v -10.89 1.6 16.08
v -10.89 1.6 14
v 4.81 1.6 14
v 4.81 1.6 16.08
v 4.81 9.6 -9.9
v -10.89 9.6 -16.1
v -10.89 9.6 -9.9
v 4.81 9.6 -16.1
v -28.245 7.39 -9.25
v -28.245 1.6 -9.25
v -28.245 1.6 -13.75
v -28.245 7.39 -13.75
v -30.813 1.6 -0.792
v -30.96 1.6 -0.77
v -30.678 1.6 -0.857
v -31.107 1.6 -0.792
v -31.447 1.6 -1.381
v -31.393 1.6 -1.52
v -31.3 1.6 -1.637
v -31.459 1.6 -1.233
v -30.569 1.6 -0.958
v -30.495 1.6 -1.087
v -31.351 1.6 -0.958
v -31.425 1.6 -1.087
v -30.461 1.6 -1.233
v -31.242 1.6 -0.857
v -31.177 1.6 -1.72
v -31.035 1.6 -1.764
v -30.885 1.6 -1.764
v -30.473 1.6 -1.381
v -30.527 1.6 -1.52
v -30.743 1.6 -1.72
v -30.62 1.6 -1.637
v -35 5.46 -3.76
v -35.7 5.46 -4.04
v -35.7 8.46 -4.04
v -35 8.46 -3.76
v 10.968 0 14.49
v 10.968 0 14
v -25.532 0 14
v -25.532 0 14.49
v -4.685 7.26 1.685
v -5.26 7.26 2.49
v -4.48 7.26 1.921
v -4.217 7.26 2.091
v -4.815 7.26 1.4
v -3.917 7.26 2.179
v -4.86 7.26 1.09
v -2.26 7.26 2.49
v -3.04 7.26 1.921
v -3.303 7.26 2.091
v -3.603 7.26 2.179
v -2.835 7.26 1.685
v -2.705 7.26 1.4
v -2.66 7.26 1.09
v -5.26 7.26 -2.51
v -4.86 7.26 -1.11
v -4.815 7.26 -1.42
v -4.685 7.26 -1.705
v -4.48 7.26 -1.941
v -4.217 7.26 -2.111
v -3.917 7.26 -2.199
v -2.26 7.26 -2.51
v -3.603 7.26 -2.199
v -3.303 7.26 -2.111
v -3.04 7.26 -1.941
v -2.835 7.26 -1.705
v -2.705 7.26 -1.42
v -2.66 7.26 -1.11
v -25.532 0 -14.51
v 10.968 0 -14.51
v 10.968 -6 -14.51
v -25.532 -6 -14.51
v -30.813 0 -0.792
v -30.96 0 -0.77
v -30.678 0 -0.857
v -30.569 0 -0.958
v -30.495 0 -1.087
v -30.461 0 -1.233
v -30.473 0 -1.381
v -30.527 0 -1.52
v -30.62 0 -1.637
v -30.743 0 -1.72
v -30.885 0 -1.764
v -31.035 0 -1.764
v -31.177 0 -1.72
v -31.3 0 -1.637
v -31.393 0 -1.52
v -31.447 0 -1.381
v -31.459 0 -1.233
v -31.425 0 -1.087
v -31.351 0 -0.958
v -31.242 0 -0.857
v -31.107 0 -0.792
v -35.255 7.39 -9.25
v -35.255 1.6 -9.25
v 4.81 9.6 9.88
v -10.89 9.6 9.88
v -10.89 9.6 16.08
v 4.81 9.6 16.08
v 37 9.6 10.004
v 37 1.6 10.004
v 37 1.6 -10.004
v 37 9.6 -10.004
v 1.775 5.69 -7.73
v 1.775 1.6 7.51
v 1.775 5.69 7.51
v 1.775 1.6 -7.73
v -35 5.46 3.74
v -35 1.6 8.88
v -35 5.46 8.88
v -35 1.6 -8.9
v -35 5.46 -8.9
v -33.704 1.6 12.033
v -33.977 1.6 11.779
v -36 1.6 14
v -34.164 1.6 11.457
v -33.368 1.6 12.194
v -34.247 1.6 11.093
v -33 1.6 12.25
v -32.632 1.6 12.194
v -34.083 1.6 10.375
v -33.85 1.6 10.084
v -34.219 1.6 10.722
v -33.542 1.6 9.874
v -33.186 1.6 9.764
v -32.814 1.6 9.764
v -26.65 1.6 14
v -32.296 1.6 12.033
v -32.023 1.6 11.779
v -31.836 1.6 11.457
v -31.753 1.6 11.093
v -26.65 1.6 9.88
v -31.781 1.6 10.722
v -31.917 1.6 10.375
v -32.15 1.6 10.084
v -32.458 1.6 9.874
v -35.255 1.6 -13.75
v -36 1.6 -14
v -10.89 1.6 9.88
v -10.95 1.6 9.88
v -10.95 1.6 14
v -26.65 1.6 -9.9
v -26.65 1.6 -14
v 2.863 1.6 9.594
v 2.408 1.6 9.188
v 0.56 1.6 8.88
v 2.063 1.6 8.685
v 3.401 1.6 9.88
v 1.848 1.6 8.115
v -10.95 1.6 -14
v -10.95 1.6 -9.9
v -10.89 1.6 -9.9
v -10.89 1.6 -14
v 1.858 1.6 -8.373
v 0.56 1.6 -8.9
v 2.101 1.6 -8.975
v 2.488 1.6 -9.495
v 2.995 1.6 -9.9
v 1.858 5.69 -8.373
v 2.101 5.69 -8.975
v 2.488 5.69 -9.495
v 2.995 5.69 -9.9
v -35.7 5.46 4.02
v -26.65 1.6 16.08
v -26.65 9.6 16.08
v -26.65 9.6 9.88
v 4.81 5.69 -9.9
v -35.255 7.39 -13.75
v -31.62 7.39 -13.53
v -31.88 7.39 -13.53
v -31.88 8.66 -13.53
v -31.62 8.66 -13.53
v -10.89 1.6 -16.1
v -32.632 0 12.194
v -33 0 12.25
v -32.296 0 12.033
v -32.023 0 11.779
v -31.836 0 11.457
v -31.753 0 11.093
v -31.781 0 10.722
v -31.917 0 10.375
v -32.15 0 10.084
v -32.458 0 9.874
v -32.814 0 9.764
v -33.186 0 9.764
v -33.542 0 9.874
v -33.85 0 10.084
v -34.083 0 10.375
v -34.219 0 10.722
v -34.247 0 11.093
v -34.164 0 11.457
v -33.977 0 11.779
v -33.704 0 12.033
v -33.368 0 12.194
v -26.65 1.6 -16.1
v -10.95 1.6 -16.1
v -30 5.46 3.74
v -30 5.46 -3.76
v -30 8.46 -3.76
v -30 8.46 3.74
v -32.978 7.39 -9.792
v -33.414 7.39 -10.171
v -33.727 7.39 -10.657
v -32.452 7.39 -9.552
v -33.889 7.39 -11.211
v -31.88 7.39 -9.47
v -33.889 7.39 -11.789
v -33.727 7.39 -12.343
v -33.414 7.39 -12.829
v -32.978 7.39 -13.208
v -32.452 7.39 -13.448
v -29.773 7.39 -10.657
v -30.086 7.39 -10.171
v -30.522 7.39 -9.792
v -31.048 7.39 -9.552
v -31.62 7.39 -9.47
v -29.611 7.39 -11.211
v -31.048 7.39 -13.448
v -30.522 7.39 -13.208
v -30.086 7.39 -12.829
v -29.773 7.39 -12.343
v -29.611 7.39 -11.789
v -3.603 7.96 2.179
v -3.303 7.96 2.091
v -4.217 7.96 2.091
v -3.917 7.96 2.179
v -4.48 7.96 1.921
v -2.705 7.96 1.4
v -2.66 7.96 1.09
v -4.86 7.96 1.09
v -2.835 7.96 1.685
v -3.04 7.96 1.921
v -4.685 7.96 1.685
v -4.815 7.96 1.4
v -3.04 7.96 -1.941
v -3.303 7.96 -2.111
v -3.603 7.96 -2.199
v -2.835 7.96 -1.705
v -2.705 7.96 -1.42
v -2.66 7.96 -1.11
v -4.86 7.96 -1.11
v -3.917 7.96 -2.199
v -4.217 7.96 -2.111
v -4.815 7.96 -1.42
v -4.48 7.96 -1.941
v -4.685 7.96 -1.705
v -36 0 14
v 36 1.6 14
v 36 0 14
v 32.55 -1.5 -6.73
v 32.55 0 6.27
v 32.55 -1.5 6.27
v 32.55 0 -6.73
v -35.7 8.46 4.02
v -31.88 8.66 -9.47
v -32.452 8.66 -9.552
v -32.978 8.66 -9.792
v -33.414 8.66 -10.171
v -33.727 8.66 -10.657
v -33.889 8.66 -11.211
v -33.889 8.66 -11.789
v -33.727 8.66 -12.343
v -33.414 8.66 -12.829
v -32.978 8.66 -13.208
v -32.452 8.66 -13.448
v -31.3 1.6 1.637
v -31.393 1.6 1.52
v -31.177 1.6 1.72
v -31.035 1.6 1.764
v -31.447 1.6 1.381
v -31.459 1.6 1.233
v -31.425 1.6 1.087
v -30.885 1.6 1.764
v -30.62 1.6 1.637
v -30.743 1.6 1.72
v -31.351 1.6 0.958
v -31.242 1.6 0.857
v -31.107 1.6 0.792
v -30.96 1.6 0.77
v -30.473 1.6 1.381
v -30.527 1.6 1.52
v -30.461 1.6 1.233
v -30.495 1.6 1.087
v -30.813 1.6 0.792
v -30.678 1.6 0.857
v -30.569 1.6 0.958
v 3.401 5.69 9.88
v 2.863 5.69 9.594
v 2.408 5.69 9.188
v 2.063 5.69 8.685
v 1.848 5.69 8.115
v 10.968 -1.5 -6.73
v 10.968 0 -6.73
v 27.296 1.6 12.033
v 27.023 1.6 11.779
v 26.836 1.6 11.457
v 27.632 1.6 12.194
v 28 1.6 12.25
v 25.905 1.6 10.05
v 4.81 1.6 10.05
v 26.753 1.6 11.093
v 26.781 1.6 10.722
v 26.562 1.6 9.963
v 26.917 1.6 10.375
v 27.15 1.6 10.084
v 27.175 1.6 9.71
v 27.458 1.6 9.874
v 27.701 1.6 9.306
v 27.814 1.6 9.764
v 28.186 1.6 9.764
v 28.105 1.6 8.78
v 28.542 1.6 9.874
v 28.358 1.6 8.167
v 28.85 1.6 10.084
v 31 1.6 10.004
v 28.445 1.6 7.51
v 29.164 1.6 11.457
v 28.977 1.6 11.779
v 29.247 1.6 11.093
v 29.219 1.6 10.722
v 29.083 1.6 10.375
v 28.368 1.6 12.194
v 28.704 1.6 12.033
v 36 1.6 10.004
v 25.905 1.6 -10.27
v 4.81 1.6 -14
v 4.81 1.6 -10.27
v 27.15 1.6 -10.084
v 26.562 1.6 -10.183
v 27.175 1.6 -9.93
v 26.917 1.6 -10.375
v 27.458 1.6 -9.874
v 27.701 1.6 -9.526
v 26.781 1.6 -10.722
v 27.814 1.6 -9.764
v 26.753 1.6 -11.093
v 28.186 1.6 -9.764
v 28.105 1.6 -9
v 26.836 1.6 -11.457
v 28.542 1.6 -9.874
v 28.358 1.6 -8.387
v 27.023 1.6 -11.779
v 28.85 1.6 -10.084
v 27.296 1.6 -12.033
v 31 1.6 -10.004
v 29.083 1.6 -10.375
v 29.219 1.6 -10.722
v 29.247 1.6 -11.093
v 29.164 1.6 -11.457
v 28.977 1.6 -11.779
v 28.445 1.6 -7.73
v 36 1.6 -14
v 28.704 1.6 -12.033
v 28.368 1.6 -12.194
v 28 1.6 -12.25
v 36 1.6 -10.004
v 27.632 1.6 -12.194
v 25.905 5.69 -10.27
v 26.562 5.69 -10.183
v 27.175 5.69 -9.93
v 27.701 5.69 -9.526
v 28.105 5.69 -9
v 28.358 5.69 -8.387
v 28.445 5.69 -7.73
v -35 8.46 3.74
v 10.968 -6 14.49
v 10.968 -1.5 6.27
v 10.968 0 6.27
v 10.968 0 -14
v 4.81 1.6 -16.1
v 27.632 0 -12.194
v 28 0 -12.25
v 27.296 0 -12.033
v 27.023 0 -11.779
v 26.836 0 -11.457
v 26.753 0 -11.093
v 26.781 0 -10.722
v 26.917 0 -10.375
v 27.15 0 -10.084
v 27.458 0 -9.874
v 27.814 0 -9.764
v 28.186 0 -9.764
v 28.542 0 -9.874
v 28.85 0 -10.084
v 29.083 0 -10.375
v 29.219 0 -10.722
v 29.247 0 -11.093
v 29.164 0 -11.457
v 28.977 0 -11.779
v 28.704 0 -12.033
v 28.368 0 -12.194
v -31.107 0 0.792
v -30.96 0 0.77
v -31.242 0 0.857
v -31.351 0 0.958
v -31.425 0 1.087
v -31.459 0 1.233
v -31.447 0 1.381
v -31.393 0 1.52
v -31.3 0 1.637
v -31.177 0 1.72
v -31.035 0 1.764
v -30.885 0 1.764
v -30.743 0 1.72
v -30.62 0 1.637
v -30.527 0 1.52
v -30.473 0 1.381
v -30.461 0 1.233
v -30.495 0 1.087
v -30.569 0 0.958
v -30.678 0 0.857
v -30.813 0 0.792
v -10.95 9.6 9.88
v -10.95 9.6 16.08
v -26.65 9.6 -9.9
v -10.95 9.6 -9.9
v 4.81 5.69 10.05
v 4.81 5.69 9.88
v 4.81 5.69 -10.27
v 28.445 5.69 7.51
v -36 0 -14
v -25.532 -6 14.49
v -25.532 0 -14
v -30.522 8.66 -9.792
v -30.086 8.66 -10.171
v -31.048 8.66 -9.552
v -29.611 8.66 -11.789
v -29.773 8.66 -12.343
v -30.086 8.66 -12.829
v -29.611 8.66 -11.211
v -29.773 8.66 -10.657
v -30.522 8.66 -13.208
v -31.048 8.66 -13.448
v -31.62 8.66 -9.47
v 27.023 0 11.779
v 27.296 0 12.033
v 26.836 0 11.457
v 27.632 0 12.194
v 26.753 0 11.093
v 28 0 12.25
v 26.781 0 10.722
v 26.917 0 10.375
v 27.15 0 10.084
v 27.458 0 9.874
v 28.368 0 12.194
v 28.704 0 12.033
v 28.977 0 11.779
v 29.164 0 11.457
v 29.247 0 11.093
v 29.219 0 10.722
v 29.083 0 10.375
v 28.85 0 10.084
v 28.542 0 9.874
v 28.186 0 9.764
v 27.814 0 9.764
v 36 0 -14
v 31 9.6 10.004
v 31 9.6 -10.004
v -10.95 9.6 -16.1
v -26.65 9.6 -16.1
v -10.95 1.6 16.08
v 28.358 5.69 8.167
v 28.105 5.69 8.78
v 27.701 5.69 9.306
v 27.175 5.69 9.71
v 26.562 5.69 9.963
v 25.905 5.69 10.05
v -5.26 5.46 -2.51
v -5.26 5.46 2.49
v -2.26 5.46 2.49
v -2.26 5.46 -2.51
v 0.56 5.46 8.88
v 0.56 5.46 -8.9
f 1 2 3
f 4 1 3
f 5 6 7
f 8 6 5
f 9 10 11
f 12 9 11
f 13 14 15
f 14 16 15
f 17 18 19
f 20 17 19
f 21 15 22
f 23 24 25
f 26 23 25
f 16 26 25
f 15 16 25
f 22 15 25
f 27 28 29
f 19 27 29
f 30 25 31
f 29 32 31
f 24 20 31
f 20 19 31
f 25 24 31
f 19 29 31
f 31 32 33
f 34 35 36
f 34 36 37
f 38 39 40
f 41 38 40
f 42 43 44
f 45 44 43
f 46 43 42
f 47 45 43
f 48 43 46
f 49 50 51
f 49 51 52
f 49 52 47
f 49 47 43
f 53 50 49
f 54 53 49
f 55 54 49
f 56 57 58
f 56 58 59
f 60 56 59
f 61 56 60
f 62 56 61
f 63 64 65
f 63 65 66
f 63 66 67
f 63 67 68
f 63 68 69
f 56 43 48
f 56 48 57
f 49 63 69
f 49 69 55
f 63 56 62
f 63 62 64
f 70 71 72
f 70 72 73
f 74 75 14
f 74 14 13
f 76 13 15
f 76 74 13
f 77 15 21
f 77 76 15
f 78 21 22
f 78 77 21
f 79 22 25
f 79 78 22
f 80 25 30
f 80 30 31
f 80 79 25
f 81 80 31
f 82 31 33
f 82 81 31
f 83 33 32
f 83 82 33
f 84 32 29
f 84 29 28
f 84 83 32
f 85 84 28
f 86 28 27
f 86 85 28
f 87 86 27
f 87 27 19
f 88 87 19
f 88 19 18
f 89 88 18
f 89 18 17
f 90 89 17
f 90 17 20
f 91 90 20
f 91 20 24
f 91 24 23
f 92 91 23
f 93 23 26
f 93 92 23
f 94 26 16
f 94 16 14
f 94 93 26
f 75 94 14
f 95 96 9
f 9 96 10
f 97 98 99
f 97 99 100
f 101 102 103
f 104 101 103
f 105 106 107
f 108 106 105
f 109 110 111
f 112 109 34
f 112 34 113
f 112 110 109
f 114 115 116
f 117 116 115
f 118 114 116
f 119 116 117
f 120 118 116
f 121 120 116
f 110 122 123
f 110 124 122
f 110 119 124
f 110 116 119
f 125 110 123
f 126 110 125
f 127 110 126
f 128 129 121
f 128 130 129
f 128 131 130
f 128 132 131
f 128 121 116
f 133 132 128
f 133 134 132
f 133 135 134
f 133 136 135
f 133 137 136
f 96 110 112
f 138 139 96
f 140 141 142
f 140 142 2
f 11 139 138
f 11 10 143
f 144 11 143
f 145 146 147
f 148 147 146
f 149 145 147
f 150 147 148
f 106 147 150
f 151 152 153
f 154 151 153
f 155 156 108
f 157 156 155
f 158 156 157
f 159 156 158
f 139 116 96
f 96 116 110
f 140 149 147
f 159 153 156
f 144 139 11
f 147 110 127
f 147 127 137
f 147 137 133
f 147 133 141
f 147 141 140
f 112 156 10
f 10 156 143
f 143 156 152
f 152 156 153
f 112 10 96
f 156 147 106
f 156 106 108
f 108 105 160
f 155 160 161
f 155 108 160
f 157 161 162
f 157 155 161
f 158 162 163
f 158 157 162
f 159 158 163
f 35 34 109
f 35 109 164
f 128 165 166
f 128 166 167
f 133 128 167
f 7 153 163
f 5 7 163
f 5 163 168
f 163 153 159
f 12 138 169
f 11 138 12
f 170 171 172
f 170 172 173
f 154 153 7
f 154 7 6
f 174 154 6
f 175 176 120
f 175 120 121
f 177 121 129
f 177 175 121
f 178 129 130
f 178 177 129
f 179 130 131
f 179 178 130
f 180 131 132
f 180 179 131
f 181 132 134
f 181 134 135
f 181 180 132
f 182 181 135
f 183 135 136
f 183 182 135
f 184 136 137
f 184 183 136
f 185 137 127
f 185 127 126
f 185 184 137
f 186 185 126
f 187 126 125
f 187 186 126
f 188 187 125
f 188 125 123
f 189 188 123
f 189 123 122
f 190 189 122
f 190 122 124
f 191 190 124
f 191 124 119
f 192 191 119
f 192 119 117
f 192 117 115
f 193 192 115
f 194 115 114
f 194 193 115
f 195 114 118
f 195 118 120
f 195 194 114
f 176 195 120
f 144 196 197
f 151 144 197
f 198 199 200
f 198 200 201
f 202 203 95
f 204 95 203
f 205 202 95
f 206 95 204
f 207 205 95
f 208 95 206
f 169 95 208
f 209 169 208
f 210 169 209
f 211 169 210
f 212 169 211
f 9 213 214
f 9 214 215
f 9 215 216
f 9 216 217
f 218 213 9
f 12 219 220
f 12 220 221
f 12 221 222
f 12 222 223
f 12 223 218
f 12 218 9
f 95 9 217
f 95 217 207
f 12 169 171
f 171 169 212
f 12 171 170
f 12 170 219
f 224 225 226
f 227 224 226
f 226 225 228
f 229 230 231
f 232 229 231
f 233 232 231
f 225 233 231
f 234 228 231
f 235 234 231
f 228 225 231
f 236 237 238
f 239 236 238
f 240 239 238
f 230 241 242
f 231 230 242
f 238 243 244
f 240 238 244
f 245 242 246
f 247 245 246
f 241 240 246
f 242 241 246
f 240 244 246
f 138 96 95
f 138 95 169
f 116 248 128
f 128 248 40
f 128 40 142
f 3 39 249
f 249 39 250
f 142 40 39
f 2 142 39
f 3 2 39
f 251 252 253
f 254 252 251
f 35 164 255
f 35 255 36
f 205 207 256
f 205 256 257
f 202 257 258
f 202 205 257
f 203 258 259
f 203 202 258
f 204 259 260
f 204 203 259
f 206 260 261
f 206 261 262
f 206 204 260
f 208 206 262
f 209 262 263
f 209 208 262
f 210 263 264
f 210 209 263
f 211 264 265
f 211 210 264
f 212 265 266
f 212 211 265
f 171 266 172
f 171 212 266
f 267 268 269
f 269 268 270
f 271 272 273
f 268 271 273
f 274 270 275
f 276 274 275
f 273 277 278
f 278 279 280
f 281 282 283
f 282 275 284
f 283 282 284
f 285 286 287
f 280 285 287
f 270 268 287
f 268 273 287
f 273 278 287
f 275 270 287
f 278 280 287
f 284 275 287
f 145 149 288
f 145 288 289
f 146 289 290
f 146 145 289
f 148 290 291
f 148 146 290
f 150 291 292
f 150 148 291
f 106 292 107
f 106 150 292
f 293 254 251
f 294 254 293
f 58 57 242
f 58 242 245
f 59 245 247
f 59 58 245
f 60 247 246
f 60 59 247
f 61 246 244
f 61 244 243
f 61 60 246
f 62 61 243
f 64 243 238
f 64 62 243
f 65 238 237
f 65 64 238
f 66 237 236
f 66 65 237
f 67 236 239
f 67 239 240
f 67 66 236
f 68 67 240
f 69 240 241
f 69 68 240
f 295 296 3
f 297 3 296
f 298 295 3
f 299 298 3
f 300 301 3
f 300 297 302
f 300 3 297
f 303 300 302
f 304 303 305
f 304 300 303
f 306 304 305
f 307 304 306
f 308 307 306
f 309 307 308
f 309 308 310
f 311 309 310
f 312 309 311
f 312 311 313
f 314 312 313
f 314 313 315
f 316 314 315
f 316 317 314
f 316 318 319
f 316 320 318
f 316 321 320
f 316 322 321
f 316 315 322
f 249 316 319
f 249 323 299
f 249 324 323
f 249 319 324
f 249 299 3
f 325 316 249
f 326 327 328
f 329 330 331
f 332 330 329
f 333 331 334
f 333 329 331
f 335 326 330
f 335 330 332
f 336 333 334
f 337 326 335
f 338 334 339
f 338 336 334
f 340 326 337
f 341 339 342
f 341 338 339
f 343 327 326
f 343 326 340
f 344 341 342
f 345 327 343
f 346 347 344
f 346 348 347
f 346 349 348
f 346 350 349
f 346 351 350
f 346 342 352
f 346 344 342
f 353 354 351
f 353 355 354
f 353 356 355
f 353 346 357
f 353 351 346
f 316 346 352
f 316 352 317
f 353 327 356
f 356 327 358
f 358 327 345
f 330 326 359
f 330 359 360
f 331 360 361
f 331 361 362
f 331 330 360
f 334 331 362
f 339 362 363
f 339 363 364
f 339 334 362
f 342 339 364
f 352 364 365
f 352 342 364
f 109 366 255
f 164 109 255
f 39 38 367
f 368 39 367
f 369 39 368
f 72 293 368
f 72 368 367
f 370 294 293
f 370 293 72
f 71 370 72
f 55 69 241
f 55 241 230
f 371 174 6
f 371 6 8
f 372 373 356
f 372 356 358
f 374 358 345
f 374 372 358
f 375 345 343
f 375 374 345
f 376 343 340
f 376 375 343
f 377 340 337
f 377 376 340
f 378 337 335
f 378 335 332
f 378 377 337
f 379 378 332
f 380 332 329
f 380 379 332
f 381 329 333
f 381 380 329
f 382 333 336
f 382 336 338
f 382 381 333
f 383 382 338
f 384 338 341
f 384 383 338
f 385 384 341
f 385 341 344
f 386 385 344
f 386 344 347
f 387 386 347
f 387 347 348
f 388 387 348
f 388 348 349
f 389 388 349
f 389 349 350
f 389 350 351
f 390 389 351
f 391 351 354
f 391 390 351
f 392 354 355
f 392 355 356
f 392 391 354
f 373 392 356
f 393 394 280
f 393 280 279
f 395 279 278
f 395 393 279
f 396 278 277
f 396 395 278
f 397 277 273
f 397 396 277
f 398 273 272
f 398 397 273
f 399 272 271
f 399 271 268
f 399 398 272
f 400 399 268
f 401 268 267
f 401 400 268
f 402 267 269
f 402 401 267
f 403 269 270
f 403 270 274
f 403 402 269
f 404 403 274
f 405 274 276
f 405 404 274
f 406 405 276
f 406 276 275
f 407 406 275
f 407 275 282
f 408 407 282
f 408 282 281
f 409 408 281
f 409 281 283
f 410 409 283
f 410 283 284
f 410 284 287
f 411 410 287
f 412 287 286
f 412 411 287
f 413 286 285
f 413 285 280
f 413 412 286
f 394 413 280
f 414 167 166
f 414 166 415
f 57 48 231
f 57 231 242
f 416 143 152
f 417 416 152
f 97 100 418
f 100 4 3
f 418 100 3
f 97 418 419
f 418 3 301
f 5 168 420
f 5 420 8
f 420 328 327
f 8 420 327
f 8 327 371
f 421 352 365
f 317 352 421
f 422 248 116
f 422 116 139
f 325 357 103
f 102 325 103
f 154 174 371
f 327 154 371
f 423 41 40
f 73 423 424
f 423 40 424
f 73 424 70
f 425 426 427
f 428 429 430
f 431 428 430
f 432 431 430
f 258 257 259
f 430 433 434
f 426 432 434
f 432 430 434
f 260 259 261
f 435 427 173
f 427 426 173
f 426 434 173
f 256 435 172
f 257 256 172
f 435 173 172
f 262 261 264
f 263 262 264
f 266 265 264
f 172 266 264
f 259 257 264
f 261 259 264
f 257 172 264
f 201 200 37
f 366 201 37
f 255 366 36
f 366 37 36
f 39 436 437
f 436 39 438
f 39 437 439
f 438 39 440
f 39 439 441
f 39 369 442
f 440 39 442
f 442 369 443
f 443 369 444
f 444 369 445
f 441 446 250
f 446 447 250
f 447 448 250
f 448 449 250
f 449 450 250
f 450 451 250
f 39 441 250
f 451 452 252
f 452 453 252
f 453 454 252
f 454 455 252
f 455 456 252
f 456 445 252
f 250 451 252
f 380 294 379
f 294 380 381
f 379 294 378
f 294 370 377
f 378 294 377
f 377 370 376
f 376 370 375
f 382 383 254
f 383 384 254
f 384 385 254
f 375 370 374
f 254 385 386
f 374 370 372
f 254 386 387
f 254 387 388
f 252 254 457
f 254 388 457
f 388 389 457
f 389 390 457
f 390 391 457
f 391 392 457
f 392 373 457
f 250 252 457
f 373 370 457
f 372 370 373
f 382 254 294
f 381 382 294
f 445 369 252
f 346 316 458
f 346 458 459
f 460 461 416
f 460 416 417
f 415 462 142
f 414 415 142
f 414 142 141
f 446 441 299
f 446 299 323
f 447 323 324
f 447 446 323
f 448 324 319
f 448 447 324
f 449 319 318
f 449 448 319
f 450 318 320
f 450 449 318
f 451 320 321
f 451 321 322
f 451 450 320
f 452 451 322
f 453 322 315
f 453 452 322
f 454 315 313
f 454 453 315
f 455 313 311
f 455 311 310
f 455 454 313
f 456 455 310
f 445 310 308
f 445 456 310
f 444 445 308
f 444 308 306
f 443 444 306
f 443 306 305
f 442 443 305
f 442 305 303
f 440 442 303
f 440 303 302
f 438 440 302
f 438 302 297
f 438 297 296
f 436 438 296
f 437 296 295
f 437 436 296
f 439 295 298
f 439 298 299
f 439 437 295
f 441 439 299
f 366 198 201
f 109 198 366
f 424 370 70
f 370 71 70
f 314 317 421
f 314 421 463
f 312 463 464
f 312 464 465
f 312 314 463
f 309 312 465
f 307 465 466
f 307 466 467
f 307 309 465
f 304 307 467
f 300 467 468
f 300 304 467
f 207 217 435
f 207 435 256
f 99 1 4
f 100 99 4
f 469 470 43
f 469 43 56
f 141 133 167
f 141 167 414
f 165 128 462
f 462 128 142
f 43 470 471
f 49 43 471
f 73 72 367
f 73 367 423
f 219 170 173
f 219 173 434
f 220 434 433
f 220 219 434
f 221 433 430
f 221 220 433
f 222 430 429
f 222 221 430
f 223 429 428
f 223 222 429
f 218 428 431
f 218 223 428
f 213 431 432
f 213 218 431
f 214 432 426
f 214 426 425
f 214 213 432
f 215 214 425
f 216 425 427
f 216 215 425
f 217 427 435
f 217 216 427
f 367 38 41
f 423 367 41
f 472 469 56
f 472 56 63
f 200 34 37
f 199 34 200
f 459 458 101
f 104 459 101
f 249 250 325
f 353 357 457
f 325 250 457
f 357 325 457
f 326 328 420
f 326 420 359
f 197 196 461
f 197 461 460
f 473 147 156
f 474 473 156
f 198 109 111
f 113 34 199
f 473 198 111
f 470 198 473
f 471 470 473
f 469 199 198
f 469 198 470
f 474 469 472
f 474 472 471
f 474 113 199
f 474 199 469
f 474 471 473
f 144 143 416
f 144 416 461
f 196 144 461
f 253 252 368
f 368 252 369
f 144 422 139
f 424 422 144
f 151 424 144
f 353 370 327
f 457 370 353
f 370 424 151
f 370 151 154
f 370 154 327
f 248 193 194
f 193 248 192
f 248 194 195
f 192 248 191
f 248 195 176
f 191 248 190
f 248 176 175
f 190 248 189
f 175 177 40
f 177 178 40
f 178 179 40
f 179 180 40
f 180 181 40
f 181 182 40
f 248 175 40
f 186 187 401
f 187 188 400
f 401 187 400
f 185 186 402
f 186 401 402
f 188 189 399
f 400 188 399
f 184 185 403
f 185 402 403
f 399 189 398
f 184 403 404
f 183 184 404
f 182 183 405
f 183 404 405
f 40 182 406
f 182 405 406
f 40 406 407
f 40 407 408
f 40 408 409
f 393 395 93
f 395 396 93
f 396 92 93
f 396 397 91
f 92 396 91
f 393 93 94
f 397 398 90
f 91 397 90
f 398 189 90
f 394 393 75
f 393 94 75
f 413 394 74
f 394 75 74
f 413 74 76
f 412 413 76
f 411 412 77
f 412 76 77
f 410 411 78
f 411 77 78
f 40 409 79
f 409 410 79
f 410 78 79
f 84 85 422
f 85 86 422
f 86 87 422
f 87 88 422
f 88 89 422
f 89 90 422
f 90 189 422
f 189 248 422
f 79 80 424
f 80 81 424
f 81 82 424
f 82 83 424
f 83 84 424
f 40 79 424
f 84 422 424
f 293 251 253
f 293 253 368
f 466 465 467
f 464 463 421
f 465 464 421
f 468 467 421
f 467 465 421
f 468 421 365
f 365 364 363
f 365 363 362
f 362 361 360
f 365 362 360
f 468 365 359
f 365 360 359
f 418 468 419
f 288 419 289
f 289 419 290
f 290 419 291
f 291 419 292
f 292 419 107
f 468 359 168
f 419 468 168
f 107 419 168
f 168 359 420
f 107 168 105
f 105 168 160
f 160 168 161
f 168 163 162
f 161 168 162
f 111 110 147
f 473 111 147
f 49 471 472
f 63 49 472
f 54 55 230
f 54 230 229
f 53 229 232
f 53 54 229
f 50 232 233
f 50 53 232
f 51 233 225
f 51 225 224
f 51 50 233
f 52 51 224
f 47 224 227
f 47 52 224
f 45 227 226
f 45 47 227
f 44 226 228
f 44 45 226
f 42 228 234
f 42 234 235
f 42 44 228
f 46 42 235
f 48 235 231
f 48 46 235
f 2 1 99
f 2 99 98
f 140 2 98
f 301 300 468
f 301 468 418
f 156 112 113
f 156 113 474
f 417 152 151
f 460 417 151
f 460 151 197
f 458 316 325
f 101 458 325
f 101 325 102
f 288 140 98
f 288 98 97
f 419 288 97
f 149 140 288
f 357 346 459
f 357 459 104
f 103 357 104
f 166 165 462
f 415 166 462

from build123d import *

# Parameters (mm, degrees)
SKETCH1_W            = 72
SKETCH1_H            = 28
SKETCH1_R            = 1.25
SKETCH1_R_2          = 0.5
BOSS_EXTRUDE1_DEPTH  = 1.6
SKETCH2_W            = 35.56
SKETCH2_H            = 17.78
BOSS_EXTRUDE2_DEPTH  = 3.86
BOSS_EXTRUDE3_DEPTH  = 3
SKETCH4_W            = 3
SKETCH4_H            = 5
BOSS_EXTRUDE4_DEPTH  = 1.8
BOSS_EXTRUDE5_DEPTH  = 0.7
BOSS_EXTRUDE6_DEPTH  = 4.09
SKETCH7_W            = 15.7
SKETCH7_H            = 6.2
BOSS_EXTRUDE7_DEPTH  = 8
SKETCH8_W            = 30
SKETCH8_H            = 13
BOSS_EXTRUDE8_DEPTH  = 1.5
SKETCH9_W            = 6
SKETCH9_H            = 20.007270078
BOSS_EXTRUDE9_DEPTH  = 8
SKETCH10_W           = 36.5
SKETCH10_H           = 29
BOSS_EXTRUDE10_DEPTH = 6
SKETCH12_W           = 7.01
SKETCH12_H           = 4.5
BOSS_EXTRUDE11_DEPTH = 5.79
BOSS_EXTRUDE12_DEPTH = 1.27


with BuildPart() as part:
    # Sketch1 → Boss-Extrude1 (new body)
    with BuildSketch(Plane(origin=(0, 0, 0), x_dir=(1, 0, 0), z_dir=(0, 1, 0))):
        Rectangle(SKETCH1_W, SKETCH1_H)
        with Locations(Location((-33, -11, 0), (0, 0, 270))):
            Circle(SKETCH1_R, mode=Mode.SUBTRACT)
        with Locations(Location((28, -11, 0), (0, 0, 270))):
            Circle(SKETCH1_R, mode=Mode.SUBTRACT)
        with Locations(Location((-30.96, 1.27, 0), (0, 0, 270))):
            Circle(SKETCH1_R_2, mode=Mode.SUBTRACT)
        with Locations(Location((28, 11, 0), (0, 0, 90))):
            Circle(SKETCH1_R, mode=Mode.SUBTRACT)
        with Locations(Location((-30.96, -1.27, 0), (0, 0, 90))):
            Circle(SKETCH1_R_2, mode=Mode.SUBTRACT)
    extrude(amount=BOSS_EXTRUDE1_DEPTH)

    # Sketch2 → Boss-Extrude2 (add)
    with BuildSketch(Plane(origin=(0, 1.6, 0), x_dir=(1, 0, 0), z_dir=(0, 1, 0))):
        with Locations((-17.22, 0.01)):
            Rectangle(SKETCH2_W, SKETCH2_H)
    extrude(amount=BOSS_EXTRUDE2_DEPTH)

    # Sketch3 → Boss-Extrude3 (add)
    with BuildSketch(Plane(origin=(0, 5.46, 0), x_dir=(1, 0, 0), z_dir=(0, 1, 0))):
        Polygon((-35, 3.76), (-30, 3.76), (-30, -3.74), (-35, -3.74), (-35.7, -4.02), (-35.7, 4.04), align=None)
    extrude(amount=BOSS_EXTRUDE3_DEPTH)

    # Sketch4 → Boss-Extrude4 (add)
    with BuildSketch(Plane(origin=(0, 5.46, 0), x_dir=(1, 0, 0), z_dir=(0, 1, 0))):
        with Locations((-3.76, 0.01)):
            Rectangle(SKETCH4_W, SKETCH4_H)
    extrude(amount=BOSS_EXTRUDE4_DEPTH)

    # Sketch5 → Boss-Extrude5 (add)
    with BuildSketch(Plane(origin=(0, 7.26, 0), x_dir=(1, 0, 0), z_dir=(0, 1, 0))):
        with BuildLine():
            Line((-2.66, 1.11), (-2.66, -1.09))
            ThreePointArc((-2.66, -1.09), (-3.76, -2.19), (-4.86, -1.09))
            Line((-4.86, -1.09), (-4.86, 1.11))
            ThreePointArc((-4.86, 1.11), (-3.76, 2.21), (-2.66, 1.11))
        make_face()
    extrude(amount=BOSS_EXTRUDE5_DEPTH)

    # Sketch6 → Boss-Extrude6 (add)
    with BuildSketch(Plane(origin=(0, 1.6, 0), x_dir=(1, 0, 0), z_dir=(0, 1, 0))):
        with BuildLine():
            Line((4.315, 10.27), (25.905, 10.27))
            ThreePointArc((25.905, 10.27), (27.701051224, 9.526051224), (28.445, 7.73))
            Line((28.445, 7.73), (28.445, -7.51))
            ThreePointArc((28.445, -7.51), (27.701051224, -9.306051224), (25.905, -10.05))
            Line((25.905, -10.05), (4.315, -10.05))
            ThreePointArc((4.315, -10.05), (2.518948776, -9.306051224), (1.775, -7.51))
            Line((1.775, -7.51), (1.775, 7.73))
            ThreePointArc((1.775, 7.73), (2.518948776, 9.526051224), (4.315, 10.27))
        make_face()
    extrude(amount=BOSS_EXTRUDE6_DEPTH)

    # Sketch7 → Boss-Extrude7 (add)
    with BuildSketch(Plane(origin=(0, 1.6, 0), x_dir=(1, 0, 0), z_dir=(0, 1, 0))):
        with Locations((-18.8, 13)):
            Rectangle(SKETCH7_W, SKETCH7_H)
        with Locations((-3.04, 13)):
            Rectangle(SKETCH7_W, SKETCH7_H)
        with Locations((-3.04, -12.98)):
            Rectangle(SKETCH7_W, SKETCH7_H)
        with Locations((-18.8, -12.98)):
            Rectangle(SKETCH7_W, SKETCH7_H)
    extrude(amount=BOSS_EXTRUDE7_DEPTH)

    # Sketch8 → Boss-Extrude8 (add)
    with BuildSketch(Plane(origin=(0, 0, 0), x_dir=(-1, 0, 0), z_dir=(0, -1, 0))):
        with Locations((-17.55, 0.22970015)):
            Rectangle(SKETCH8_W, SKETCH8_H)
    extrude(amount=BOSS_EXTRUDE8_DEPTH)

    # Sketch9 → Boss-Extrude9 (add)
    with BuildSketch(Plane(origin=(0, 1.6, 0), x_dir=(1, 0, 0), z_dir=(0, 1, 0))):
        with Locations((34, 0)):
            Rectangle(SKETCH9_W, SKETCH9_H)
    extrude(amount=BOSS_EXTRUDE9_DEPTH)

    # Sketch10 → Boss-Extrude10 (add)
    with BuildSketch(Plane(origin=(0, 0, 0), x_dir=(-1, 0, 0), z_dir=(0, -1, 0))):
        with Locations((7.281732971, 0.01)):
            Rectangle(SKETCH10_W, SKETCH10_H)
    extrude(amount=BOSS_EXTRUDE10_DEPTH)

    # Sketch12 → Boss-Extrude11 (add)
    with BuildSketch(Plane(origin=(0, 1.6, 0), x_dir=(1, 0, 0), z_dir=(0, 1, 0))):
        with Locations((-31.75, 11.5)):
            Rectangle(SKETCH12_W, SKETCH12_H)
    extrude(amount=BOSS_EXTRUDE11_DEPTH)

    # Sketch13 → Boss-Extrude12 (add)
    with BuildSketch(Plane(origin=(0, 7.39, 0), x_dir=(1, 0, 0), z_dir=(0, 1, 0))):
        with BuildLine():
            Line((-31.88, 13.53), (-31.62, 13.53))
            ThreePointArc((-31.62, 13.53), (-29.59, 11.5), (-31.62, 9.47))
            Line((-31.62, 9.47), (-31.88, 9.47))
            ThreePointArc((-31.88, 9.47), (-33.91, 11.5), (-31.88, 13.53))
        make_face()
    extrude(amount=BOSS_EXTRUDE12_DEPTH)


solid = part.part
